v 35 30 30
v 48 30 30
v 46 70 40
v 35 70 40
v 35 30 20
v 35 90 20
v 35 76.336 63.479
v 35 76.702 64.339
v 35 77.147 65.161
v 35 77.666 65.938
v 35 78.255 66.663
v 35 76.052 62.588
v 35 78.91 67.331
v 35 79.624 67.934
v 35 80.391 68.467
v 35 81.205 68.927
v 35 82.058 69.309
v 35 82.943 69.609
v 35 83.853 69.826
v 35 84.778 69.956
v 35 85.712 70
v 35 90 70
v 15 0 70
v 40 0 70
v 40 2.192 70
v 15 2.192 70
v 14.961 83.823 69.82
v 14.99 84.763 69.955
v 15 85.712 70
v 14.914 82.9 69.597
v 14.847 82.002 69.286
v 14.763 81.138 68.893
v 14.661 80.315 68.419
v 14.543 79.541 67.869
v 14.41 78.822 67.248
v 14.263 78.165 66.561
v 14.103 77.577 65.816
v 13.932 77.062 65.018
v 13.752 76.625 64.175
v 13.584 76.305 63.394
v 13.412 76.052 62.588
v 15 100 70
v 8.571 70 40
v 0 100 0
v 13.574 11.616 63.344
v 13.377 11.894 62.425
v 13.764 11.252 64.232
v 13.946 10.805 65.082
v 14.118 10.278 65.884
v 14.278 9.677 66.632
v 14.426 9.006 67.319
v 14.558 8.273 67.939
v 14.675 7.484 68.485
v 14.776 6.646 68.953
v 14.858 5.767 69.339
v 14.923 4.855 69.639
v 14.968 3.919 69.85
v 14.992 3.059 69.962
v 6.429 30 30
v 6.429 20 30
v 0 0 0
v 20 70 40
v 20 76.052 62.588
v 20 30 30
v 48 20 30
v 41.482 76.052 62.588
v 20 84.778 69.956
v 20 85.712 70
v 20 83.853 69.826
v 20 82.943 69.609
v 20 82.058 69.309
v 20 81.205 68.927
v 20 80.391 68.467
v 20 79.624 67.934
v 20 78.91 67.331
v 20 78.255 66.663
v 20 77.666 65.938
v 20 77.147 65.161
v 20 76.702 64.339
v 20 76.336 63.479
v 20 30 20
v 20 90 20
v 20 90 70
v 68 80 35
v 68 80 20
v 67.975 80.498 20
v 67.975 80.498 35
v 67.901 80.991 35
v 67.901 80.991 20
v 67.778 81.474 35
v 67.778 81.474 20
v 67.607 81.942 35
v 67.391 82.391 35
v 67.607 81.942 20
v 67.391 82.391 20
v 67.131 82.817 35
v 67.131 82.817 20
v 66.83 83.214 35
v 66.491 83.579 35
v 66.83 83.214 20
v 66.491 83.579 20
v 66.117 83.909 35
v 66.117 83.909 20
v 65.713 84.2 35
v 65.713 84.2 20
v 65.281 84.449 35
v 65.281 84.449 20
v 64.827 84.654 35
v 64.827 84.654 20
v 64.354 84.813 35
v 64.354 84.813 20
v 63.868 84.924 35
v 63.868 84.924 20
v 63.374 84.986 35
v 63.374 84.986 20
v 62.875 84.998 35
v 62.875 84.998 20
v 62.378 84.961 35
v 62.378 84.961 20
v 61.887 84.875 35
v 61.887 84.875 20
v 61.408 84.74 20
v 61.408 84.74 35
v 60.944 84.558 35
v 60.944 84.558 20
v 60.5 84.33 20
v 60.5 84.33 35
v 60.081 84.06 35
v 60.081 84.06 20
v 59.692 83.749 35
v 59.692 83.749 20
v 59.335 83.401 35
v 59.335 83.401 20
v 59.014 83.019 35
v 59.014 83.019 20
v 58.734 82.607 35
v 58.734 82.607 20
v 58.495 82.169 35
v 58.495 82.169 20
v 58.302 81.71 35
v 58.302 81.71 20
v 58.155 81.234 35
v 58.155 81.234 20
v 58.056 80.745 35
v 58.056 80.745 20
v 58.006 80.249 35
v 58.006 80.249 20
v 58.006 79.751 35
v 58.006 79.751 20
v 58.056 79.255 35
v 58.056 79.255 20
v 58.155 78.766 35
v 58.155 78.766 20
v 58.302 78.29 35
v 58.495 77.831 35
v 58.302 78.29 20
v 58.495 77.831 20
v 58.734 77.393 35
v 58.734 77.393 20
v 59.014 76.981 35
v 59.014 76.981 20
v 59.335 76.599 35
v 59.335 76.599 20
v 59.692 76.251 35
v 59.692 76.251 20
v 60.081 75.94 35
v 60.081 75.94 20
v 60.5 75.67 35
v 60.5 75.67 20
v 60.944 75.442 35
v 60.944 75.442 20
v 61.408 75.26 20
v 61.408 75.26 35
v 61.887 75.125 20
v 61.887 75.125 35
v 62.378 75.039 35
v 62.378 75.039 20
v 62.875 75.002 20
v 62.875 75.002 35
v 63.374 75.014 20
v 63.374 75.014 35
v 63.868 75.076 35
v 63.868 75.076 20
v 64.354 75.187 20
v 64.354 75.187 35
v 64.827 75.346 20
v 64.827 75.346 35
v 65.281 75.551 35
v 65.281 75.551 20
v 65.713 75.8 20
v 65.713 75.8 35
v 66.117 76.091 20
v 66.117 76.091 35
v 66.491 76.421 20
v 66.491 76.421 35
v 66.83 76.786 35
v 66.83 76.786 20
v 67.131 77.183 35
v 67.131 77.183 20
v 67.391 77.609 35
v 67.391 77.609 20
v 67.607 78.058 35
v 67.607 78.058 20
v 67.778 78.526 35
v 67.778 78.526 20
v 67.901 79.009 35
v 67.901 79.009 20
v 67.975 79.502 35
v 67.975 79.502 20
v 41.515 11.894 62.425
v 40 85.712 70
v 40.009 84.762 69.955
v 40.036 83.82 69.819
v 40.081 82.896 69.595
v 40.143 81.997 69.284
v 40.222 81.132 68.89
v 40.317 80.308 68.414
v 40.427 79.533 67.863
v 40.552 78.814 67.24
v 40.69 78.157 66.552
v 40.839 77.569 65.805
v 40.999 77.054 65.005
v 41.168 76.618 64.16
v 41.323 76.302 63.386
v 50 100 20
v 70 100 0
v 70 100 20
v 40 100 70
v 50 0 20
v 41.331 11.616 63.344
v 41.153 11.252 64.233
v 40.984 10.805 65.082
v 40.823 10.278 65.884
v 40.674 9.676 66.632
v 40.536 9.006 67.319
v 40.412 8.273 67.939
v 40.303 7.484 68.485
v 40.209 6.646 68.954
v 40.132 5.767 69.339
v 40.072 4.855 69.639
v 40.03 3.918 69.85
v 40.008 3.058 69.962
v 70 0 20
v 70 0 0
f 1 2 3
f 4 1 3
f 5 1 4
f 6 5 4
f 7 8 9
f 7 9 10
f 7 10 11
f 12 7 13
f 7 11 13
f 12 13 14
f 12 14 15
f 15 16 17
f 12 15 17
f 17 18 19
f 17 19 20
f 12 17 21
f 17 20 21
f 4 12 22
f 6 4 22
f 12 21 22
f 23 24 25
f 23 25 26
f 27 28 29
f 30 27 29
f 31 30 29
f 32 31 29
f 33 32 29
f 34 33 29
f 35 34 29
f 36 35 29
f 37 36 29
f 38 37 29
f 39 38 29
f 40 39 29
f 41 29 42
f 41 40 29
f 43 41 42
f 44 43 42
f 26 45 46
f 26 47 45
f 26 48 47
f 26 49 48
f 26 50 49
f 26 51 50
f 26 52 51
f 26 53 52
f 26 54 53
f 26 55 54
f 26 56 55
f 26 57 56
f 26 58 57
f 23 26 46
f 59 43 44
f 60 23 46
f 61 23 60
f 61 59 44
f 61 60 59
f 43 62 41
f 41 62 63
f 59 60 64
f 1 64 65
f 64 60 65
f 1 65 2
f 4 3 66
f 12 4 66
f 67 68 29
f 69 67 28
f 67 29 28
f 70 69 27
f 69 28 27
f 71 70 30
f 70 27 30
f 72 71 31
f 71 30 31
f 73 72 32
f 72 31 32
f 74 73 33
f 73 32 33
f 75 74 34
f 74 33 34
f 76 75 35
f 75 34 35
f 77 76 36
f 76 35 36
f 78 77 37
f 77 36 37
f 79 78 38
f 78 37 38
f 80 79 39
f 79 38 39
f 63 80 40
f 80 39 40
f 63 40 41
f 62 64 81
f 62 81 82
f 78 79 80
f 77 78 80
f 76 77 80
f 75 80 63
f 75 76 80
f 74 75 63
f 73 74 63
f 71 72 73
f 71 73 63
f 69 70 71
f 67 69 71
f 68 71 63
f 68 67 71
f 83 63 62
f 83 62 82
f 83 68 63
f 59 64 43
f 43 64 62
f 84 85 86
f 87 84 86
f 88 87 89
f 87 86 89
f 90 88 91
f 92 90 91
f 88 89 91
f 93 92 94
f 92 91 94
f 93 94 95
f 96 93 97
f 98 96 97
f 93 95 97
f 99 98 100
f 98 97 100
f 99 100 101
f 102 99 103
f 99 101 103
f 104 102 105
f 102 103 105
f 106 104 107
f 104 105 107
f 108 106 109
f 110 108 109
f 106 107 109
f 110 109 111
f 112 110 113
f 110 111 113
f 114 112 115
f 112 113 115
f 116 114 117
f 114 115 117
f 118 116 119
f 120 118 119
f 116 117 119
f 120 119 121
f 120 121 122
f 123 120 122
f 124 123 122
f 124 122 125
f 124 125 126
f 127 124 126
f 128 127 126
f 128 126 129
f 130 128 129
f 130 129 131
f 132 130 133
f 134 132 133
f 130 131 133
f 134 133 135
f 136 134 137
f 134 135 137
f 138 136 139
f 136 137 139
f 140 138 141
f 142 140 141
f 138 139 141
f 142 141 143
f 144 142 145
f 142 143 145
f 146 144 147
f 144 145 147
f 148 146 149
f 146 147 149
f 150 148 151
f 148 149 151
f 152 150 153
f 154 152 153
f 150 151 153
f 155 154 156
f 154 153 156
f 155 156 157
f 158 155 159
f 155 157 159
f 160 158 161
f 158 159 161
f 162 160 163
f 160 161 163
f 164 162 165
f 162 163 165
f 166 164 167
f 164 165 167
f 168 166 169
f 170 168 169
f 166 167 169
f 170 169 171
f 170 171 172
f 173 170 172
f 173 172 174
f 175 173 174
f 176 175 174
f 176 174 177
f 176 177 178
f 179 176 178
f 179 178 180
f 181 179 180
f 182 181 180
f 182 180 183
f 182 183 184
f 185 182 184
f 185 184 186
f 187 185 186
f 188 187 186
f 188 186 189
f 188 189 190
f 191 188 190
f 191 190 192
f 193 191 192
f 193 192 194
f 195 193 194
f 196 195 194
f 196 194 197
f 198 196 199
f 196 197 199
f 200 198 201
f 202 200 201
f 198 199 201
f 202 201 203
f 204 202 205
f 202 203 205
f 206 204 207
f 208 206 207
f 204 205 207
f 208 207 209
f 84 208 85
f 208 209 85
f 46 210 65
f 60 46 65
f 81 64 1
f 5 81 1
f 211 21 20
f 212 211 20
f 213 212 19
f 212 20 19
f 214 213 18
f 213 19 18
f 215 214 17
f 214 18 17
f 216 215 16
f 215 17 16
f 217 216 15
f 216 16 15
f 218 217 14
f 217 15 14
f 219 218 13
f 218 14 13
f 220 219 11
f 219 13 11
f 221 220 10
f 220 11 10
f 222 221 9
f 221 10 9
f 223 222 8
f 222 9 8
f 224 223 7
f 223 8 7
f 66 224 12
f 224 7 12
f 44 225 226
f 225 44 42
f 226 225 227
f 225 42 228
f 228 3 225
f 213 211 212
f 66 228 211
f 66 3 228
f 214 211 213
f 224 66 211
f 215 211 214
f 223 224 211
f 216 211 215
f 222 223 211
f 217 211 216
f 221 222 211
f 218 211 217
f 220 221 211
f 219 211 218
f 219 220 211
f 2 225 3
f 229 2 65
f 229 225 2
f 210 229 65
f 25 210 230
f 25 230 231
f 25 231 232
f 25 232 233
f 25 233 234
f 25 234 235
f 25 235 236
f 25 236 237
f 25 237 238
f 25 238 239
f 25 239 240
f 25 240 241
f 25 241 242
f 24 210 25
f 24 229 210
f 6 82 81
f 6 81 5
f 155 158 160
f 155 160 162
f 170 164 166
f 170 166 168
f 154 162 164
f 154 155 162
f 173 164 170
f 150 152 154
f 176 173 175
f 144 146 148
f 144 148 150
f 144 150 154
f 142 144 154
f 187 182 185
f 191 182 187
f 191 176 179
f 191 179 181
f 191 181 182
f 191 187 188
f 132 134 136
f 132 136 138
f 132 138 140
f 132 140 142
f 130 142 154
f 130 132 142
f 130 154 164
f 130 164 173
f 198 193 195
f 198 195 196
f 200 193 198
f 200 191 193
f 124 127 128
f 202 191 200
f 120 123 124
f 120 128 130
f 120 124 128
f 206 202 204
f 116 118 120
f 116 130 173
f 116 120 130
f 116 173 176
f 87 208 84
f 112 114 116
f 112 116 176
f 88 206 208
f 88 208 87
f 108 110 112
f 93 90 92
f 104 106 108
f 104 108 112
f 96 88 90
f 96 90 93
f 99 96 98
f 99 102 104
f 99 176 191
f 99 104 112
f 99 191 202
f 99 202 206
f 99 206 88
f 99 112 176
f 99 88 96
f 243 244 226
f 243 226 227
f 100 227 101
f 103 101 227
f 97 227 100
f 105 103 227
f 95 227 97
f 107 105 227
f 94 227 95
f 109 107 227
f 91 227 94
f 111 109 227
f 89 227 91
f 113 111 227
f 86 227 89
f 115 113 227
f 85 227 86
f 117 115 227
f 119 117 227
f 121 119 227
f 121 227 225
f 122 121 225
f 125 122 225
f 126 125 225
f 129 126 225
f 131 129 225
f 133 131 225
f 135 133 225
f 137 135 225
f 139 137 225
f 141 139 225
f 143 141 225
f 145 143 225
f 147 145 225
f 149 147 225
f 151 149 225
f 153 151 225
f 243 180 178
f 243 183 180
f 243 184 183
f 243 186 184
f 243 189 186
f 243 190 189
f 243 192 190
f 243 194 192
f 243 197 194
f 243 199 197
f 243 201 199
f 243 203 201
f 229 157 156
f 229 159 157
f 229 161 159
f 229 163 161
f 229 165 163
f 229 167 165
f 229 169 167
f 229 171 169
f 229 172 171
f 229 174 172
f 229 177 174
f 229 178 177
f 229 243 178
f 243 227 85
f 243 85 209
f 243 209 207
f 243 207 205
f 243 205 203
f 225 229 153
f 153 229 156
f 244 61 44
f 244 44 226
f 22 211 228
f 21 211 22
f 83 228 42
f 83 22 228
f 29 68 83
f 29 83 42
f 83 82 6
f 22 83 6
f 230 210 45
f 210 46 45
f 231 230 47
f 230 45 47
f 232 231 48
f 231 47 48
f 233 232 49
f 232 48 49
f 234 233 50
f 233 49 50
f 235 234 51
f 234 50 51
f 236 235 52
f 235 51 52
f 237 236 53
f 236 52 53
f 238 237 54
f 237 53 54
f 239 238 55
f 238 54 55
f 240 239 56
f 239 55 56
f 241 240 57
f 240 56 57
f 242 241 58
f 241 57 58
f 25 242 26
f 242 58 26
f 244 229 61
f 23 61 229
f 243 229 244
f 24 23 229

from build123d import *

# Parameters (mm, degrees)
F1_DEPTH = 100
F3_DEPTH = 70.001
F4_R     = 10
F5_W     = 15
F5_H     = 60
F6_DEPTH = 50
F7_R     = 5
F8_DEPTH = 15


with BuildPart() as f1:
    # F0 (on Front) → F1 (new body)
    with BuildSketch(Plane.XZ):
        Polygon((15, 70), (0, 0), (70, 0), (70, 20), (50, 20), (40, 70), align=None)
    extrude(amount=-F1_DEPTH)

    # F2 (on face) → F3 (cut, through all)
    with BuildSketch(Plane.YZ.offset(70)):
        Polygon((78.038476, 70), (10, 70), (20, 30), (30, 30), (70, 40), align=None)
    extrude(amount=-F3_DEPTH, mode=Mode.SUBTRACT)

    # F4
    f4_edges = [f1.edges().sort_by_distance(p)[0] for p in [
        (27.5, 10, 70),
        (27.5, 78.038476, 70),
    ]]
    fillet(f4_edges, radius=F4_R)

    # F5 (on face) → F6 (cut)
    with BuildSketch(Plane.XY.offset(70)):
        with Locations((27.5, 60)):
            Rectangle(F5_W, F5_H)
    extrude(amount=-F6_DEPTH, mode=Mode.SUBTRACT)

    # F7 (on face) → F8 (join)
    with BuildSketch(Plane.XY.offset(20)):
        with Locations((63, 80)):
            Circle(F7_R)
    extrude(amount=F8_DEPTH)


solid = f1.part
